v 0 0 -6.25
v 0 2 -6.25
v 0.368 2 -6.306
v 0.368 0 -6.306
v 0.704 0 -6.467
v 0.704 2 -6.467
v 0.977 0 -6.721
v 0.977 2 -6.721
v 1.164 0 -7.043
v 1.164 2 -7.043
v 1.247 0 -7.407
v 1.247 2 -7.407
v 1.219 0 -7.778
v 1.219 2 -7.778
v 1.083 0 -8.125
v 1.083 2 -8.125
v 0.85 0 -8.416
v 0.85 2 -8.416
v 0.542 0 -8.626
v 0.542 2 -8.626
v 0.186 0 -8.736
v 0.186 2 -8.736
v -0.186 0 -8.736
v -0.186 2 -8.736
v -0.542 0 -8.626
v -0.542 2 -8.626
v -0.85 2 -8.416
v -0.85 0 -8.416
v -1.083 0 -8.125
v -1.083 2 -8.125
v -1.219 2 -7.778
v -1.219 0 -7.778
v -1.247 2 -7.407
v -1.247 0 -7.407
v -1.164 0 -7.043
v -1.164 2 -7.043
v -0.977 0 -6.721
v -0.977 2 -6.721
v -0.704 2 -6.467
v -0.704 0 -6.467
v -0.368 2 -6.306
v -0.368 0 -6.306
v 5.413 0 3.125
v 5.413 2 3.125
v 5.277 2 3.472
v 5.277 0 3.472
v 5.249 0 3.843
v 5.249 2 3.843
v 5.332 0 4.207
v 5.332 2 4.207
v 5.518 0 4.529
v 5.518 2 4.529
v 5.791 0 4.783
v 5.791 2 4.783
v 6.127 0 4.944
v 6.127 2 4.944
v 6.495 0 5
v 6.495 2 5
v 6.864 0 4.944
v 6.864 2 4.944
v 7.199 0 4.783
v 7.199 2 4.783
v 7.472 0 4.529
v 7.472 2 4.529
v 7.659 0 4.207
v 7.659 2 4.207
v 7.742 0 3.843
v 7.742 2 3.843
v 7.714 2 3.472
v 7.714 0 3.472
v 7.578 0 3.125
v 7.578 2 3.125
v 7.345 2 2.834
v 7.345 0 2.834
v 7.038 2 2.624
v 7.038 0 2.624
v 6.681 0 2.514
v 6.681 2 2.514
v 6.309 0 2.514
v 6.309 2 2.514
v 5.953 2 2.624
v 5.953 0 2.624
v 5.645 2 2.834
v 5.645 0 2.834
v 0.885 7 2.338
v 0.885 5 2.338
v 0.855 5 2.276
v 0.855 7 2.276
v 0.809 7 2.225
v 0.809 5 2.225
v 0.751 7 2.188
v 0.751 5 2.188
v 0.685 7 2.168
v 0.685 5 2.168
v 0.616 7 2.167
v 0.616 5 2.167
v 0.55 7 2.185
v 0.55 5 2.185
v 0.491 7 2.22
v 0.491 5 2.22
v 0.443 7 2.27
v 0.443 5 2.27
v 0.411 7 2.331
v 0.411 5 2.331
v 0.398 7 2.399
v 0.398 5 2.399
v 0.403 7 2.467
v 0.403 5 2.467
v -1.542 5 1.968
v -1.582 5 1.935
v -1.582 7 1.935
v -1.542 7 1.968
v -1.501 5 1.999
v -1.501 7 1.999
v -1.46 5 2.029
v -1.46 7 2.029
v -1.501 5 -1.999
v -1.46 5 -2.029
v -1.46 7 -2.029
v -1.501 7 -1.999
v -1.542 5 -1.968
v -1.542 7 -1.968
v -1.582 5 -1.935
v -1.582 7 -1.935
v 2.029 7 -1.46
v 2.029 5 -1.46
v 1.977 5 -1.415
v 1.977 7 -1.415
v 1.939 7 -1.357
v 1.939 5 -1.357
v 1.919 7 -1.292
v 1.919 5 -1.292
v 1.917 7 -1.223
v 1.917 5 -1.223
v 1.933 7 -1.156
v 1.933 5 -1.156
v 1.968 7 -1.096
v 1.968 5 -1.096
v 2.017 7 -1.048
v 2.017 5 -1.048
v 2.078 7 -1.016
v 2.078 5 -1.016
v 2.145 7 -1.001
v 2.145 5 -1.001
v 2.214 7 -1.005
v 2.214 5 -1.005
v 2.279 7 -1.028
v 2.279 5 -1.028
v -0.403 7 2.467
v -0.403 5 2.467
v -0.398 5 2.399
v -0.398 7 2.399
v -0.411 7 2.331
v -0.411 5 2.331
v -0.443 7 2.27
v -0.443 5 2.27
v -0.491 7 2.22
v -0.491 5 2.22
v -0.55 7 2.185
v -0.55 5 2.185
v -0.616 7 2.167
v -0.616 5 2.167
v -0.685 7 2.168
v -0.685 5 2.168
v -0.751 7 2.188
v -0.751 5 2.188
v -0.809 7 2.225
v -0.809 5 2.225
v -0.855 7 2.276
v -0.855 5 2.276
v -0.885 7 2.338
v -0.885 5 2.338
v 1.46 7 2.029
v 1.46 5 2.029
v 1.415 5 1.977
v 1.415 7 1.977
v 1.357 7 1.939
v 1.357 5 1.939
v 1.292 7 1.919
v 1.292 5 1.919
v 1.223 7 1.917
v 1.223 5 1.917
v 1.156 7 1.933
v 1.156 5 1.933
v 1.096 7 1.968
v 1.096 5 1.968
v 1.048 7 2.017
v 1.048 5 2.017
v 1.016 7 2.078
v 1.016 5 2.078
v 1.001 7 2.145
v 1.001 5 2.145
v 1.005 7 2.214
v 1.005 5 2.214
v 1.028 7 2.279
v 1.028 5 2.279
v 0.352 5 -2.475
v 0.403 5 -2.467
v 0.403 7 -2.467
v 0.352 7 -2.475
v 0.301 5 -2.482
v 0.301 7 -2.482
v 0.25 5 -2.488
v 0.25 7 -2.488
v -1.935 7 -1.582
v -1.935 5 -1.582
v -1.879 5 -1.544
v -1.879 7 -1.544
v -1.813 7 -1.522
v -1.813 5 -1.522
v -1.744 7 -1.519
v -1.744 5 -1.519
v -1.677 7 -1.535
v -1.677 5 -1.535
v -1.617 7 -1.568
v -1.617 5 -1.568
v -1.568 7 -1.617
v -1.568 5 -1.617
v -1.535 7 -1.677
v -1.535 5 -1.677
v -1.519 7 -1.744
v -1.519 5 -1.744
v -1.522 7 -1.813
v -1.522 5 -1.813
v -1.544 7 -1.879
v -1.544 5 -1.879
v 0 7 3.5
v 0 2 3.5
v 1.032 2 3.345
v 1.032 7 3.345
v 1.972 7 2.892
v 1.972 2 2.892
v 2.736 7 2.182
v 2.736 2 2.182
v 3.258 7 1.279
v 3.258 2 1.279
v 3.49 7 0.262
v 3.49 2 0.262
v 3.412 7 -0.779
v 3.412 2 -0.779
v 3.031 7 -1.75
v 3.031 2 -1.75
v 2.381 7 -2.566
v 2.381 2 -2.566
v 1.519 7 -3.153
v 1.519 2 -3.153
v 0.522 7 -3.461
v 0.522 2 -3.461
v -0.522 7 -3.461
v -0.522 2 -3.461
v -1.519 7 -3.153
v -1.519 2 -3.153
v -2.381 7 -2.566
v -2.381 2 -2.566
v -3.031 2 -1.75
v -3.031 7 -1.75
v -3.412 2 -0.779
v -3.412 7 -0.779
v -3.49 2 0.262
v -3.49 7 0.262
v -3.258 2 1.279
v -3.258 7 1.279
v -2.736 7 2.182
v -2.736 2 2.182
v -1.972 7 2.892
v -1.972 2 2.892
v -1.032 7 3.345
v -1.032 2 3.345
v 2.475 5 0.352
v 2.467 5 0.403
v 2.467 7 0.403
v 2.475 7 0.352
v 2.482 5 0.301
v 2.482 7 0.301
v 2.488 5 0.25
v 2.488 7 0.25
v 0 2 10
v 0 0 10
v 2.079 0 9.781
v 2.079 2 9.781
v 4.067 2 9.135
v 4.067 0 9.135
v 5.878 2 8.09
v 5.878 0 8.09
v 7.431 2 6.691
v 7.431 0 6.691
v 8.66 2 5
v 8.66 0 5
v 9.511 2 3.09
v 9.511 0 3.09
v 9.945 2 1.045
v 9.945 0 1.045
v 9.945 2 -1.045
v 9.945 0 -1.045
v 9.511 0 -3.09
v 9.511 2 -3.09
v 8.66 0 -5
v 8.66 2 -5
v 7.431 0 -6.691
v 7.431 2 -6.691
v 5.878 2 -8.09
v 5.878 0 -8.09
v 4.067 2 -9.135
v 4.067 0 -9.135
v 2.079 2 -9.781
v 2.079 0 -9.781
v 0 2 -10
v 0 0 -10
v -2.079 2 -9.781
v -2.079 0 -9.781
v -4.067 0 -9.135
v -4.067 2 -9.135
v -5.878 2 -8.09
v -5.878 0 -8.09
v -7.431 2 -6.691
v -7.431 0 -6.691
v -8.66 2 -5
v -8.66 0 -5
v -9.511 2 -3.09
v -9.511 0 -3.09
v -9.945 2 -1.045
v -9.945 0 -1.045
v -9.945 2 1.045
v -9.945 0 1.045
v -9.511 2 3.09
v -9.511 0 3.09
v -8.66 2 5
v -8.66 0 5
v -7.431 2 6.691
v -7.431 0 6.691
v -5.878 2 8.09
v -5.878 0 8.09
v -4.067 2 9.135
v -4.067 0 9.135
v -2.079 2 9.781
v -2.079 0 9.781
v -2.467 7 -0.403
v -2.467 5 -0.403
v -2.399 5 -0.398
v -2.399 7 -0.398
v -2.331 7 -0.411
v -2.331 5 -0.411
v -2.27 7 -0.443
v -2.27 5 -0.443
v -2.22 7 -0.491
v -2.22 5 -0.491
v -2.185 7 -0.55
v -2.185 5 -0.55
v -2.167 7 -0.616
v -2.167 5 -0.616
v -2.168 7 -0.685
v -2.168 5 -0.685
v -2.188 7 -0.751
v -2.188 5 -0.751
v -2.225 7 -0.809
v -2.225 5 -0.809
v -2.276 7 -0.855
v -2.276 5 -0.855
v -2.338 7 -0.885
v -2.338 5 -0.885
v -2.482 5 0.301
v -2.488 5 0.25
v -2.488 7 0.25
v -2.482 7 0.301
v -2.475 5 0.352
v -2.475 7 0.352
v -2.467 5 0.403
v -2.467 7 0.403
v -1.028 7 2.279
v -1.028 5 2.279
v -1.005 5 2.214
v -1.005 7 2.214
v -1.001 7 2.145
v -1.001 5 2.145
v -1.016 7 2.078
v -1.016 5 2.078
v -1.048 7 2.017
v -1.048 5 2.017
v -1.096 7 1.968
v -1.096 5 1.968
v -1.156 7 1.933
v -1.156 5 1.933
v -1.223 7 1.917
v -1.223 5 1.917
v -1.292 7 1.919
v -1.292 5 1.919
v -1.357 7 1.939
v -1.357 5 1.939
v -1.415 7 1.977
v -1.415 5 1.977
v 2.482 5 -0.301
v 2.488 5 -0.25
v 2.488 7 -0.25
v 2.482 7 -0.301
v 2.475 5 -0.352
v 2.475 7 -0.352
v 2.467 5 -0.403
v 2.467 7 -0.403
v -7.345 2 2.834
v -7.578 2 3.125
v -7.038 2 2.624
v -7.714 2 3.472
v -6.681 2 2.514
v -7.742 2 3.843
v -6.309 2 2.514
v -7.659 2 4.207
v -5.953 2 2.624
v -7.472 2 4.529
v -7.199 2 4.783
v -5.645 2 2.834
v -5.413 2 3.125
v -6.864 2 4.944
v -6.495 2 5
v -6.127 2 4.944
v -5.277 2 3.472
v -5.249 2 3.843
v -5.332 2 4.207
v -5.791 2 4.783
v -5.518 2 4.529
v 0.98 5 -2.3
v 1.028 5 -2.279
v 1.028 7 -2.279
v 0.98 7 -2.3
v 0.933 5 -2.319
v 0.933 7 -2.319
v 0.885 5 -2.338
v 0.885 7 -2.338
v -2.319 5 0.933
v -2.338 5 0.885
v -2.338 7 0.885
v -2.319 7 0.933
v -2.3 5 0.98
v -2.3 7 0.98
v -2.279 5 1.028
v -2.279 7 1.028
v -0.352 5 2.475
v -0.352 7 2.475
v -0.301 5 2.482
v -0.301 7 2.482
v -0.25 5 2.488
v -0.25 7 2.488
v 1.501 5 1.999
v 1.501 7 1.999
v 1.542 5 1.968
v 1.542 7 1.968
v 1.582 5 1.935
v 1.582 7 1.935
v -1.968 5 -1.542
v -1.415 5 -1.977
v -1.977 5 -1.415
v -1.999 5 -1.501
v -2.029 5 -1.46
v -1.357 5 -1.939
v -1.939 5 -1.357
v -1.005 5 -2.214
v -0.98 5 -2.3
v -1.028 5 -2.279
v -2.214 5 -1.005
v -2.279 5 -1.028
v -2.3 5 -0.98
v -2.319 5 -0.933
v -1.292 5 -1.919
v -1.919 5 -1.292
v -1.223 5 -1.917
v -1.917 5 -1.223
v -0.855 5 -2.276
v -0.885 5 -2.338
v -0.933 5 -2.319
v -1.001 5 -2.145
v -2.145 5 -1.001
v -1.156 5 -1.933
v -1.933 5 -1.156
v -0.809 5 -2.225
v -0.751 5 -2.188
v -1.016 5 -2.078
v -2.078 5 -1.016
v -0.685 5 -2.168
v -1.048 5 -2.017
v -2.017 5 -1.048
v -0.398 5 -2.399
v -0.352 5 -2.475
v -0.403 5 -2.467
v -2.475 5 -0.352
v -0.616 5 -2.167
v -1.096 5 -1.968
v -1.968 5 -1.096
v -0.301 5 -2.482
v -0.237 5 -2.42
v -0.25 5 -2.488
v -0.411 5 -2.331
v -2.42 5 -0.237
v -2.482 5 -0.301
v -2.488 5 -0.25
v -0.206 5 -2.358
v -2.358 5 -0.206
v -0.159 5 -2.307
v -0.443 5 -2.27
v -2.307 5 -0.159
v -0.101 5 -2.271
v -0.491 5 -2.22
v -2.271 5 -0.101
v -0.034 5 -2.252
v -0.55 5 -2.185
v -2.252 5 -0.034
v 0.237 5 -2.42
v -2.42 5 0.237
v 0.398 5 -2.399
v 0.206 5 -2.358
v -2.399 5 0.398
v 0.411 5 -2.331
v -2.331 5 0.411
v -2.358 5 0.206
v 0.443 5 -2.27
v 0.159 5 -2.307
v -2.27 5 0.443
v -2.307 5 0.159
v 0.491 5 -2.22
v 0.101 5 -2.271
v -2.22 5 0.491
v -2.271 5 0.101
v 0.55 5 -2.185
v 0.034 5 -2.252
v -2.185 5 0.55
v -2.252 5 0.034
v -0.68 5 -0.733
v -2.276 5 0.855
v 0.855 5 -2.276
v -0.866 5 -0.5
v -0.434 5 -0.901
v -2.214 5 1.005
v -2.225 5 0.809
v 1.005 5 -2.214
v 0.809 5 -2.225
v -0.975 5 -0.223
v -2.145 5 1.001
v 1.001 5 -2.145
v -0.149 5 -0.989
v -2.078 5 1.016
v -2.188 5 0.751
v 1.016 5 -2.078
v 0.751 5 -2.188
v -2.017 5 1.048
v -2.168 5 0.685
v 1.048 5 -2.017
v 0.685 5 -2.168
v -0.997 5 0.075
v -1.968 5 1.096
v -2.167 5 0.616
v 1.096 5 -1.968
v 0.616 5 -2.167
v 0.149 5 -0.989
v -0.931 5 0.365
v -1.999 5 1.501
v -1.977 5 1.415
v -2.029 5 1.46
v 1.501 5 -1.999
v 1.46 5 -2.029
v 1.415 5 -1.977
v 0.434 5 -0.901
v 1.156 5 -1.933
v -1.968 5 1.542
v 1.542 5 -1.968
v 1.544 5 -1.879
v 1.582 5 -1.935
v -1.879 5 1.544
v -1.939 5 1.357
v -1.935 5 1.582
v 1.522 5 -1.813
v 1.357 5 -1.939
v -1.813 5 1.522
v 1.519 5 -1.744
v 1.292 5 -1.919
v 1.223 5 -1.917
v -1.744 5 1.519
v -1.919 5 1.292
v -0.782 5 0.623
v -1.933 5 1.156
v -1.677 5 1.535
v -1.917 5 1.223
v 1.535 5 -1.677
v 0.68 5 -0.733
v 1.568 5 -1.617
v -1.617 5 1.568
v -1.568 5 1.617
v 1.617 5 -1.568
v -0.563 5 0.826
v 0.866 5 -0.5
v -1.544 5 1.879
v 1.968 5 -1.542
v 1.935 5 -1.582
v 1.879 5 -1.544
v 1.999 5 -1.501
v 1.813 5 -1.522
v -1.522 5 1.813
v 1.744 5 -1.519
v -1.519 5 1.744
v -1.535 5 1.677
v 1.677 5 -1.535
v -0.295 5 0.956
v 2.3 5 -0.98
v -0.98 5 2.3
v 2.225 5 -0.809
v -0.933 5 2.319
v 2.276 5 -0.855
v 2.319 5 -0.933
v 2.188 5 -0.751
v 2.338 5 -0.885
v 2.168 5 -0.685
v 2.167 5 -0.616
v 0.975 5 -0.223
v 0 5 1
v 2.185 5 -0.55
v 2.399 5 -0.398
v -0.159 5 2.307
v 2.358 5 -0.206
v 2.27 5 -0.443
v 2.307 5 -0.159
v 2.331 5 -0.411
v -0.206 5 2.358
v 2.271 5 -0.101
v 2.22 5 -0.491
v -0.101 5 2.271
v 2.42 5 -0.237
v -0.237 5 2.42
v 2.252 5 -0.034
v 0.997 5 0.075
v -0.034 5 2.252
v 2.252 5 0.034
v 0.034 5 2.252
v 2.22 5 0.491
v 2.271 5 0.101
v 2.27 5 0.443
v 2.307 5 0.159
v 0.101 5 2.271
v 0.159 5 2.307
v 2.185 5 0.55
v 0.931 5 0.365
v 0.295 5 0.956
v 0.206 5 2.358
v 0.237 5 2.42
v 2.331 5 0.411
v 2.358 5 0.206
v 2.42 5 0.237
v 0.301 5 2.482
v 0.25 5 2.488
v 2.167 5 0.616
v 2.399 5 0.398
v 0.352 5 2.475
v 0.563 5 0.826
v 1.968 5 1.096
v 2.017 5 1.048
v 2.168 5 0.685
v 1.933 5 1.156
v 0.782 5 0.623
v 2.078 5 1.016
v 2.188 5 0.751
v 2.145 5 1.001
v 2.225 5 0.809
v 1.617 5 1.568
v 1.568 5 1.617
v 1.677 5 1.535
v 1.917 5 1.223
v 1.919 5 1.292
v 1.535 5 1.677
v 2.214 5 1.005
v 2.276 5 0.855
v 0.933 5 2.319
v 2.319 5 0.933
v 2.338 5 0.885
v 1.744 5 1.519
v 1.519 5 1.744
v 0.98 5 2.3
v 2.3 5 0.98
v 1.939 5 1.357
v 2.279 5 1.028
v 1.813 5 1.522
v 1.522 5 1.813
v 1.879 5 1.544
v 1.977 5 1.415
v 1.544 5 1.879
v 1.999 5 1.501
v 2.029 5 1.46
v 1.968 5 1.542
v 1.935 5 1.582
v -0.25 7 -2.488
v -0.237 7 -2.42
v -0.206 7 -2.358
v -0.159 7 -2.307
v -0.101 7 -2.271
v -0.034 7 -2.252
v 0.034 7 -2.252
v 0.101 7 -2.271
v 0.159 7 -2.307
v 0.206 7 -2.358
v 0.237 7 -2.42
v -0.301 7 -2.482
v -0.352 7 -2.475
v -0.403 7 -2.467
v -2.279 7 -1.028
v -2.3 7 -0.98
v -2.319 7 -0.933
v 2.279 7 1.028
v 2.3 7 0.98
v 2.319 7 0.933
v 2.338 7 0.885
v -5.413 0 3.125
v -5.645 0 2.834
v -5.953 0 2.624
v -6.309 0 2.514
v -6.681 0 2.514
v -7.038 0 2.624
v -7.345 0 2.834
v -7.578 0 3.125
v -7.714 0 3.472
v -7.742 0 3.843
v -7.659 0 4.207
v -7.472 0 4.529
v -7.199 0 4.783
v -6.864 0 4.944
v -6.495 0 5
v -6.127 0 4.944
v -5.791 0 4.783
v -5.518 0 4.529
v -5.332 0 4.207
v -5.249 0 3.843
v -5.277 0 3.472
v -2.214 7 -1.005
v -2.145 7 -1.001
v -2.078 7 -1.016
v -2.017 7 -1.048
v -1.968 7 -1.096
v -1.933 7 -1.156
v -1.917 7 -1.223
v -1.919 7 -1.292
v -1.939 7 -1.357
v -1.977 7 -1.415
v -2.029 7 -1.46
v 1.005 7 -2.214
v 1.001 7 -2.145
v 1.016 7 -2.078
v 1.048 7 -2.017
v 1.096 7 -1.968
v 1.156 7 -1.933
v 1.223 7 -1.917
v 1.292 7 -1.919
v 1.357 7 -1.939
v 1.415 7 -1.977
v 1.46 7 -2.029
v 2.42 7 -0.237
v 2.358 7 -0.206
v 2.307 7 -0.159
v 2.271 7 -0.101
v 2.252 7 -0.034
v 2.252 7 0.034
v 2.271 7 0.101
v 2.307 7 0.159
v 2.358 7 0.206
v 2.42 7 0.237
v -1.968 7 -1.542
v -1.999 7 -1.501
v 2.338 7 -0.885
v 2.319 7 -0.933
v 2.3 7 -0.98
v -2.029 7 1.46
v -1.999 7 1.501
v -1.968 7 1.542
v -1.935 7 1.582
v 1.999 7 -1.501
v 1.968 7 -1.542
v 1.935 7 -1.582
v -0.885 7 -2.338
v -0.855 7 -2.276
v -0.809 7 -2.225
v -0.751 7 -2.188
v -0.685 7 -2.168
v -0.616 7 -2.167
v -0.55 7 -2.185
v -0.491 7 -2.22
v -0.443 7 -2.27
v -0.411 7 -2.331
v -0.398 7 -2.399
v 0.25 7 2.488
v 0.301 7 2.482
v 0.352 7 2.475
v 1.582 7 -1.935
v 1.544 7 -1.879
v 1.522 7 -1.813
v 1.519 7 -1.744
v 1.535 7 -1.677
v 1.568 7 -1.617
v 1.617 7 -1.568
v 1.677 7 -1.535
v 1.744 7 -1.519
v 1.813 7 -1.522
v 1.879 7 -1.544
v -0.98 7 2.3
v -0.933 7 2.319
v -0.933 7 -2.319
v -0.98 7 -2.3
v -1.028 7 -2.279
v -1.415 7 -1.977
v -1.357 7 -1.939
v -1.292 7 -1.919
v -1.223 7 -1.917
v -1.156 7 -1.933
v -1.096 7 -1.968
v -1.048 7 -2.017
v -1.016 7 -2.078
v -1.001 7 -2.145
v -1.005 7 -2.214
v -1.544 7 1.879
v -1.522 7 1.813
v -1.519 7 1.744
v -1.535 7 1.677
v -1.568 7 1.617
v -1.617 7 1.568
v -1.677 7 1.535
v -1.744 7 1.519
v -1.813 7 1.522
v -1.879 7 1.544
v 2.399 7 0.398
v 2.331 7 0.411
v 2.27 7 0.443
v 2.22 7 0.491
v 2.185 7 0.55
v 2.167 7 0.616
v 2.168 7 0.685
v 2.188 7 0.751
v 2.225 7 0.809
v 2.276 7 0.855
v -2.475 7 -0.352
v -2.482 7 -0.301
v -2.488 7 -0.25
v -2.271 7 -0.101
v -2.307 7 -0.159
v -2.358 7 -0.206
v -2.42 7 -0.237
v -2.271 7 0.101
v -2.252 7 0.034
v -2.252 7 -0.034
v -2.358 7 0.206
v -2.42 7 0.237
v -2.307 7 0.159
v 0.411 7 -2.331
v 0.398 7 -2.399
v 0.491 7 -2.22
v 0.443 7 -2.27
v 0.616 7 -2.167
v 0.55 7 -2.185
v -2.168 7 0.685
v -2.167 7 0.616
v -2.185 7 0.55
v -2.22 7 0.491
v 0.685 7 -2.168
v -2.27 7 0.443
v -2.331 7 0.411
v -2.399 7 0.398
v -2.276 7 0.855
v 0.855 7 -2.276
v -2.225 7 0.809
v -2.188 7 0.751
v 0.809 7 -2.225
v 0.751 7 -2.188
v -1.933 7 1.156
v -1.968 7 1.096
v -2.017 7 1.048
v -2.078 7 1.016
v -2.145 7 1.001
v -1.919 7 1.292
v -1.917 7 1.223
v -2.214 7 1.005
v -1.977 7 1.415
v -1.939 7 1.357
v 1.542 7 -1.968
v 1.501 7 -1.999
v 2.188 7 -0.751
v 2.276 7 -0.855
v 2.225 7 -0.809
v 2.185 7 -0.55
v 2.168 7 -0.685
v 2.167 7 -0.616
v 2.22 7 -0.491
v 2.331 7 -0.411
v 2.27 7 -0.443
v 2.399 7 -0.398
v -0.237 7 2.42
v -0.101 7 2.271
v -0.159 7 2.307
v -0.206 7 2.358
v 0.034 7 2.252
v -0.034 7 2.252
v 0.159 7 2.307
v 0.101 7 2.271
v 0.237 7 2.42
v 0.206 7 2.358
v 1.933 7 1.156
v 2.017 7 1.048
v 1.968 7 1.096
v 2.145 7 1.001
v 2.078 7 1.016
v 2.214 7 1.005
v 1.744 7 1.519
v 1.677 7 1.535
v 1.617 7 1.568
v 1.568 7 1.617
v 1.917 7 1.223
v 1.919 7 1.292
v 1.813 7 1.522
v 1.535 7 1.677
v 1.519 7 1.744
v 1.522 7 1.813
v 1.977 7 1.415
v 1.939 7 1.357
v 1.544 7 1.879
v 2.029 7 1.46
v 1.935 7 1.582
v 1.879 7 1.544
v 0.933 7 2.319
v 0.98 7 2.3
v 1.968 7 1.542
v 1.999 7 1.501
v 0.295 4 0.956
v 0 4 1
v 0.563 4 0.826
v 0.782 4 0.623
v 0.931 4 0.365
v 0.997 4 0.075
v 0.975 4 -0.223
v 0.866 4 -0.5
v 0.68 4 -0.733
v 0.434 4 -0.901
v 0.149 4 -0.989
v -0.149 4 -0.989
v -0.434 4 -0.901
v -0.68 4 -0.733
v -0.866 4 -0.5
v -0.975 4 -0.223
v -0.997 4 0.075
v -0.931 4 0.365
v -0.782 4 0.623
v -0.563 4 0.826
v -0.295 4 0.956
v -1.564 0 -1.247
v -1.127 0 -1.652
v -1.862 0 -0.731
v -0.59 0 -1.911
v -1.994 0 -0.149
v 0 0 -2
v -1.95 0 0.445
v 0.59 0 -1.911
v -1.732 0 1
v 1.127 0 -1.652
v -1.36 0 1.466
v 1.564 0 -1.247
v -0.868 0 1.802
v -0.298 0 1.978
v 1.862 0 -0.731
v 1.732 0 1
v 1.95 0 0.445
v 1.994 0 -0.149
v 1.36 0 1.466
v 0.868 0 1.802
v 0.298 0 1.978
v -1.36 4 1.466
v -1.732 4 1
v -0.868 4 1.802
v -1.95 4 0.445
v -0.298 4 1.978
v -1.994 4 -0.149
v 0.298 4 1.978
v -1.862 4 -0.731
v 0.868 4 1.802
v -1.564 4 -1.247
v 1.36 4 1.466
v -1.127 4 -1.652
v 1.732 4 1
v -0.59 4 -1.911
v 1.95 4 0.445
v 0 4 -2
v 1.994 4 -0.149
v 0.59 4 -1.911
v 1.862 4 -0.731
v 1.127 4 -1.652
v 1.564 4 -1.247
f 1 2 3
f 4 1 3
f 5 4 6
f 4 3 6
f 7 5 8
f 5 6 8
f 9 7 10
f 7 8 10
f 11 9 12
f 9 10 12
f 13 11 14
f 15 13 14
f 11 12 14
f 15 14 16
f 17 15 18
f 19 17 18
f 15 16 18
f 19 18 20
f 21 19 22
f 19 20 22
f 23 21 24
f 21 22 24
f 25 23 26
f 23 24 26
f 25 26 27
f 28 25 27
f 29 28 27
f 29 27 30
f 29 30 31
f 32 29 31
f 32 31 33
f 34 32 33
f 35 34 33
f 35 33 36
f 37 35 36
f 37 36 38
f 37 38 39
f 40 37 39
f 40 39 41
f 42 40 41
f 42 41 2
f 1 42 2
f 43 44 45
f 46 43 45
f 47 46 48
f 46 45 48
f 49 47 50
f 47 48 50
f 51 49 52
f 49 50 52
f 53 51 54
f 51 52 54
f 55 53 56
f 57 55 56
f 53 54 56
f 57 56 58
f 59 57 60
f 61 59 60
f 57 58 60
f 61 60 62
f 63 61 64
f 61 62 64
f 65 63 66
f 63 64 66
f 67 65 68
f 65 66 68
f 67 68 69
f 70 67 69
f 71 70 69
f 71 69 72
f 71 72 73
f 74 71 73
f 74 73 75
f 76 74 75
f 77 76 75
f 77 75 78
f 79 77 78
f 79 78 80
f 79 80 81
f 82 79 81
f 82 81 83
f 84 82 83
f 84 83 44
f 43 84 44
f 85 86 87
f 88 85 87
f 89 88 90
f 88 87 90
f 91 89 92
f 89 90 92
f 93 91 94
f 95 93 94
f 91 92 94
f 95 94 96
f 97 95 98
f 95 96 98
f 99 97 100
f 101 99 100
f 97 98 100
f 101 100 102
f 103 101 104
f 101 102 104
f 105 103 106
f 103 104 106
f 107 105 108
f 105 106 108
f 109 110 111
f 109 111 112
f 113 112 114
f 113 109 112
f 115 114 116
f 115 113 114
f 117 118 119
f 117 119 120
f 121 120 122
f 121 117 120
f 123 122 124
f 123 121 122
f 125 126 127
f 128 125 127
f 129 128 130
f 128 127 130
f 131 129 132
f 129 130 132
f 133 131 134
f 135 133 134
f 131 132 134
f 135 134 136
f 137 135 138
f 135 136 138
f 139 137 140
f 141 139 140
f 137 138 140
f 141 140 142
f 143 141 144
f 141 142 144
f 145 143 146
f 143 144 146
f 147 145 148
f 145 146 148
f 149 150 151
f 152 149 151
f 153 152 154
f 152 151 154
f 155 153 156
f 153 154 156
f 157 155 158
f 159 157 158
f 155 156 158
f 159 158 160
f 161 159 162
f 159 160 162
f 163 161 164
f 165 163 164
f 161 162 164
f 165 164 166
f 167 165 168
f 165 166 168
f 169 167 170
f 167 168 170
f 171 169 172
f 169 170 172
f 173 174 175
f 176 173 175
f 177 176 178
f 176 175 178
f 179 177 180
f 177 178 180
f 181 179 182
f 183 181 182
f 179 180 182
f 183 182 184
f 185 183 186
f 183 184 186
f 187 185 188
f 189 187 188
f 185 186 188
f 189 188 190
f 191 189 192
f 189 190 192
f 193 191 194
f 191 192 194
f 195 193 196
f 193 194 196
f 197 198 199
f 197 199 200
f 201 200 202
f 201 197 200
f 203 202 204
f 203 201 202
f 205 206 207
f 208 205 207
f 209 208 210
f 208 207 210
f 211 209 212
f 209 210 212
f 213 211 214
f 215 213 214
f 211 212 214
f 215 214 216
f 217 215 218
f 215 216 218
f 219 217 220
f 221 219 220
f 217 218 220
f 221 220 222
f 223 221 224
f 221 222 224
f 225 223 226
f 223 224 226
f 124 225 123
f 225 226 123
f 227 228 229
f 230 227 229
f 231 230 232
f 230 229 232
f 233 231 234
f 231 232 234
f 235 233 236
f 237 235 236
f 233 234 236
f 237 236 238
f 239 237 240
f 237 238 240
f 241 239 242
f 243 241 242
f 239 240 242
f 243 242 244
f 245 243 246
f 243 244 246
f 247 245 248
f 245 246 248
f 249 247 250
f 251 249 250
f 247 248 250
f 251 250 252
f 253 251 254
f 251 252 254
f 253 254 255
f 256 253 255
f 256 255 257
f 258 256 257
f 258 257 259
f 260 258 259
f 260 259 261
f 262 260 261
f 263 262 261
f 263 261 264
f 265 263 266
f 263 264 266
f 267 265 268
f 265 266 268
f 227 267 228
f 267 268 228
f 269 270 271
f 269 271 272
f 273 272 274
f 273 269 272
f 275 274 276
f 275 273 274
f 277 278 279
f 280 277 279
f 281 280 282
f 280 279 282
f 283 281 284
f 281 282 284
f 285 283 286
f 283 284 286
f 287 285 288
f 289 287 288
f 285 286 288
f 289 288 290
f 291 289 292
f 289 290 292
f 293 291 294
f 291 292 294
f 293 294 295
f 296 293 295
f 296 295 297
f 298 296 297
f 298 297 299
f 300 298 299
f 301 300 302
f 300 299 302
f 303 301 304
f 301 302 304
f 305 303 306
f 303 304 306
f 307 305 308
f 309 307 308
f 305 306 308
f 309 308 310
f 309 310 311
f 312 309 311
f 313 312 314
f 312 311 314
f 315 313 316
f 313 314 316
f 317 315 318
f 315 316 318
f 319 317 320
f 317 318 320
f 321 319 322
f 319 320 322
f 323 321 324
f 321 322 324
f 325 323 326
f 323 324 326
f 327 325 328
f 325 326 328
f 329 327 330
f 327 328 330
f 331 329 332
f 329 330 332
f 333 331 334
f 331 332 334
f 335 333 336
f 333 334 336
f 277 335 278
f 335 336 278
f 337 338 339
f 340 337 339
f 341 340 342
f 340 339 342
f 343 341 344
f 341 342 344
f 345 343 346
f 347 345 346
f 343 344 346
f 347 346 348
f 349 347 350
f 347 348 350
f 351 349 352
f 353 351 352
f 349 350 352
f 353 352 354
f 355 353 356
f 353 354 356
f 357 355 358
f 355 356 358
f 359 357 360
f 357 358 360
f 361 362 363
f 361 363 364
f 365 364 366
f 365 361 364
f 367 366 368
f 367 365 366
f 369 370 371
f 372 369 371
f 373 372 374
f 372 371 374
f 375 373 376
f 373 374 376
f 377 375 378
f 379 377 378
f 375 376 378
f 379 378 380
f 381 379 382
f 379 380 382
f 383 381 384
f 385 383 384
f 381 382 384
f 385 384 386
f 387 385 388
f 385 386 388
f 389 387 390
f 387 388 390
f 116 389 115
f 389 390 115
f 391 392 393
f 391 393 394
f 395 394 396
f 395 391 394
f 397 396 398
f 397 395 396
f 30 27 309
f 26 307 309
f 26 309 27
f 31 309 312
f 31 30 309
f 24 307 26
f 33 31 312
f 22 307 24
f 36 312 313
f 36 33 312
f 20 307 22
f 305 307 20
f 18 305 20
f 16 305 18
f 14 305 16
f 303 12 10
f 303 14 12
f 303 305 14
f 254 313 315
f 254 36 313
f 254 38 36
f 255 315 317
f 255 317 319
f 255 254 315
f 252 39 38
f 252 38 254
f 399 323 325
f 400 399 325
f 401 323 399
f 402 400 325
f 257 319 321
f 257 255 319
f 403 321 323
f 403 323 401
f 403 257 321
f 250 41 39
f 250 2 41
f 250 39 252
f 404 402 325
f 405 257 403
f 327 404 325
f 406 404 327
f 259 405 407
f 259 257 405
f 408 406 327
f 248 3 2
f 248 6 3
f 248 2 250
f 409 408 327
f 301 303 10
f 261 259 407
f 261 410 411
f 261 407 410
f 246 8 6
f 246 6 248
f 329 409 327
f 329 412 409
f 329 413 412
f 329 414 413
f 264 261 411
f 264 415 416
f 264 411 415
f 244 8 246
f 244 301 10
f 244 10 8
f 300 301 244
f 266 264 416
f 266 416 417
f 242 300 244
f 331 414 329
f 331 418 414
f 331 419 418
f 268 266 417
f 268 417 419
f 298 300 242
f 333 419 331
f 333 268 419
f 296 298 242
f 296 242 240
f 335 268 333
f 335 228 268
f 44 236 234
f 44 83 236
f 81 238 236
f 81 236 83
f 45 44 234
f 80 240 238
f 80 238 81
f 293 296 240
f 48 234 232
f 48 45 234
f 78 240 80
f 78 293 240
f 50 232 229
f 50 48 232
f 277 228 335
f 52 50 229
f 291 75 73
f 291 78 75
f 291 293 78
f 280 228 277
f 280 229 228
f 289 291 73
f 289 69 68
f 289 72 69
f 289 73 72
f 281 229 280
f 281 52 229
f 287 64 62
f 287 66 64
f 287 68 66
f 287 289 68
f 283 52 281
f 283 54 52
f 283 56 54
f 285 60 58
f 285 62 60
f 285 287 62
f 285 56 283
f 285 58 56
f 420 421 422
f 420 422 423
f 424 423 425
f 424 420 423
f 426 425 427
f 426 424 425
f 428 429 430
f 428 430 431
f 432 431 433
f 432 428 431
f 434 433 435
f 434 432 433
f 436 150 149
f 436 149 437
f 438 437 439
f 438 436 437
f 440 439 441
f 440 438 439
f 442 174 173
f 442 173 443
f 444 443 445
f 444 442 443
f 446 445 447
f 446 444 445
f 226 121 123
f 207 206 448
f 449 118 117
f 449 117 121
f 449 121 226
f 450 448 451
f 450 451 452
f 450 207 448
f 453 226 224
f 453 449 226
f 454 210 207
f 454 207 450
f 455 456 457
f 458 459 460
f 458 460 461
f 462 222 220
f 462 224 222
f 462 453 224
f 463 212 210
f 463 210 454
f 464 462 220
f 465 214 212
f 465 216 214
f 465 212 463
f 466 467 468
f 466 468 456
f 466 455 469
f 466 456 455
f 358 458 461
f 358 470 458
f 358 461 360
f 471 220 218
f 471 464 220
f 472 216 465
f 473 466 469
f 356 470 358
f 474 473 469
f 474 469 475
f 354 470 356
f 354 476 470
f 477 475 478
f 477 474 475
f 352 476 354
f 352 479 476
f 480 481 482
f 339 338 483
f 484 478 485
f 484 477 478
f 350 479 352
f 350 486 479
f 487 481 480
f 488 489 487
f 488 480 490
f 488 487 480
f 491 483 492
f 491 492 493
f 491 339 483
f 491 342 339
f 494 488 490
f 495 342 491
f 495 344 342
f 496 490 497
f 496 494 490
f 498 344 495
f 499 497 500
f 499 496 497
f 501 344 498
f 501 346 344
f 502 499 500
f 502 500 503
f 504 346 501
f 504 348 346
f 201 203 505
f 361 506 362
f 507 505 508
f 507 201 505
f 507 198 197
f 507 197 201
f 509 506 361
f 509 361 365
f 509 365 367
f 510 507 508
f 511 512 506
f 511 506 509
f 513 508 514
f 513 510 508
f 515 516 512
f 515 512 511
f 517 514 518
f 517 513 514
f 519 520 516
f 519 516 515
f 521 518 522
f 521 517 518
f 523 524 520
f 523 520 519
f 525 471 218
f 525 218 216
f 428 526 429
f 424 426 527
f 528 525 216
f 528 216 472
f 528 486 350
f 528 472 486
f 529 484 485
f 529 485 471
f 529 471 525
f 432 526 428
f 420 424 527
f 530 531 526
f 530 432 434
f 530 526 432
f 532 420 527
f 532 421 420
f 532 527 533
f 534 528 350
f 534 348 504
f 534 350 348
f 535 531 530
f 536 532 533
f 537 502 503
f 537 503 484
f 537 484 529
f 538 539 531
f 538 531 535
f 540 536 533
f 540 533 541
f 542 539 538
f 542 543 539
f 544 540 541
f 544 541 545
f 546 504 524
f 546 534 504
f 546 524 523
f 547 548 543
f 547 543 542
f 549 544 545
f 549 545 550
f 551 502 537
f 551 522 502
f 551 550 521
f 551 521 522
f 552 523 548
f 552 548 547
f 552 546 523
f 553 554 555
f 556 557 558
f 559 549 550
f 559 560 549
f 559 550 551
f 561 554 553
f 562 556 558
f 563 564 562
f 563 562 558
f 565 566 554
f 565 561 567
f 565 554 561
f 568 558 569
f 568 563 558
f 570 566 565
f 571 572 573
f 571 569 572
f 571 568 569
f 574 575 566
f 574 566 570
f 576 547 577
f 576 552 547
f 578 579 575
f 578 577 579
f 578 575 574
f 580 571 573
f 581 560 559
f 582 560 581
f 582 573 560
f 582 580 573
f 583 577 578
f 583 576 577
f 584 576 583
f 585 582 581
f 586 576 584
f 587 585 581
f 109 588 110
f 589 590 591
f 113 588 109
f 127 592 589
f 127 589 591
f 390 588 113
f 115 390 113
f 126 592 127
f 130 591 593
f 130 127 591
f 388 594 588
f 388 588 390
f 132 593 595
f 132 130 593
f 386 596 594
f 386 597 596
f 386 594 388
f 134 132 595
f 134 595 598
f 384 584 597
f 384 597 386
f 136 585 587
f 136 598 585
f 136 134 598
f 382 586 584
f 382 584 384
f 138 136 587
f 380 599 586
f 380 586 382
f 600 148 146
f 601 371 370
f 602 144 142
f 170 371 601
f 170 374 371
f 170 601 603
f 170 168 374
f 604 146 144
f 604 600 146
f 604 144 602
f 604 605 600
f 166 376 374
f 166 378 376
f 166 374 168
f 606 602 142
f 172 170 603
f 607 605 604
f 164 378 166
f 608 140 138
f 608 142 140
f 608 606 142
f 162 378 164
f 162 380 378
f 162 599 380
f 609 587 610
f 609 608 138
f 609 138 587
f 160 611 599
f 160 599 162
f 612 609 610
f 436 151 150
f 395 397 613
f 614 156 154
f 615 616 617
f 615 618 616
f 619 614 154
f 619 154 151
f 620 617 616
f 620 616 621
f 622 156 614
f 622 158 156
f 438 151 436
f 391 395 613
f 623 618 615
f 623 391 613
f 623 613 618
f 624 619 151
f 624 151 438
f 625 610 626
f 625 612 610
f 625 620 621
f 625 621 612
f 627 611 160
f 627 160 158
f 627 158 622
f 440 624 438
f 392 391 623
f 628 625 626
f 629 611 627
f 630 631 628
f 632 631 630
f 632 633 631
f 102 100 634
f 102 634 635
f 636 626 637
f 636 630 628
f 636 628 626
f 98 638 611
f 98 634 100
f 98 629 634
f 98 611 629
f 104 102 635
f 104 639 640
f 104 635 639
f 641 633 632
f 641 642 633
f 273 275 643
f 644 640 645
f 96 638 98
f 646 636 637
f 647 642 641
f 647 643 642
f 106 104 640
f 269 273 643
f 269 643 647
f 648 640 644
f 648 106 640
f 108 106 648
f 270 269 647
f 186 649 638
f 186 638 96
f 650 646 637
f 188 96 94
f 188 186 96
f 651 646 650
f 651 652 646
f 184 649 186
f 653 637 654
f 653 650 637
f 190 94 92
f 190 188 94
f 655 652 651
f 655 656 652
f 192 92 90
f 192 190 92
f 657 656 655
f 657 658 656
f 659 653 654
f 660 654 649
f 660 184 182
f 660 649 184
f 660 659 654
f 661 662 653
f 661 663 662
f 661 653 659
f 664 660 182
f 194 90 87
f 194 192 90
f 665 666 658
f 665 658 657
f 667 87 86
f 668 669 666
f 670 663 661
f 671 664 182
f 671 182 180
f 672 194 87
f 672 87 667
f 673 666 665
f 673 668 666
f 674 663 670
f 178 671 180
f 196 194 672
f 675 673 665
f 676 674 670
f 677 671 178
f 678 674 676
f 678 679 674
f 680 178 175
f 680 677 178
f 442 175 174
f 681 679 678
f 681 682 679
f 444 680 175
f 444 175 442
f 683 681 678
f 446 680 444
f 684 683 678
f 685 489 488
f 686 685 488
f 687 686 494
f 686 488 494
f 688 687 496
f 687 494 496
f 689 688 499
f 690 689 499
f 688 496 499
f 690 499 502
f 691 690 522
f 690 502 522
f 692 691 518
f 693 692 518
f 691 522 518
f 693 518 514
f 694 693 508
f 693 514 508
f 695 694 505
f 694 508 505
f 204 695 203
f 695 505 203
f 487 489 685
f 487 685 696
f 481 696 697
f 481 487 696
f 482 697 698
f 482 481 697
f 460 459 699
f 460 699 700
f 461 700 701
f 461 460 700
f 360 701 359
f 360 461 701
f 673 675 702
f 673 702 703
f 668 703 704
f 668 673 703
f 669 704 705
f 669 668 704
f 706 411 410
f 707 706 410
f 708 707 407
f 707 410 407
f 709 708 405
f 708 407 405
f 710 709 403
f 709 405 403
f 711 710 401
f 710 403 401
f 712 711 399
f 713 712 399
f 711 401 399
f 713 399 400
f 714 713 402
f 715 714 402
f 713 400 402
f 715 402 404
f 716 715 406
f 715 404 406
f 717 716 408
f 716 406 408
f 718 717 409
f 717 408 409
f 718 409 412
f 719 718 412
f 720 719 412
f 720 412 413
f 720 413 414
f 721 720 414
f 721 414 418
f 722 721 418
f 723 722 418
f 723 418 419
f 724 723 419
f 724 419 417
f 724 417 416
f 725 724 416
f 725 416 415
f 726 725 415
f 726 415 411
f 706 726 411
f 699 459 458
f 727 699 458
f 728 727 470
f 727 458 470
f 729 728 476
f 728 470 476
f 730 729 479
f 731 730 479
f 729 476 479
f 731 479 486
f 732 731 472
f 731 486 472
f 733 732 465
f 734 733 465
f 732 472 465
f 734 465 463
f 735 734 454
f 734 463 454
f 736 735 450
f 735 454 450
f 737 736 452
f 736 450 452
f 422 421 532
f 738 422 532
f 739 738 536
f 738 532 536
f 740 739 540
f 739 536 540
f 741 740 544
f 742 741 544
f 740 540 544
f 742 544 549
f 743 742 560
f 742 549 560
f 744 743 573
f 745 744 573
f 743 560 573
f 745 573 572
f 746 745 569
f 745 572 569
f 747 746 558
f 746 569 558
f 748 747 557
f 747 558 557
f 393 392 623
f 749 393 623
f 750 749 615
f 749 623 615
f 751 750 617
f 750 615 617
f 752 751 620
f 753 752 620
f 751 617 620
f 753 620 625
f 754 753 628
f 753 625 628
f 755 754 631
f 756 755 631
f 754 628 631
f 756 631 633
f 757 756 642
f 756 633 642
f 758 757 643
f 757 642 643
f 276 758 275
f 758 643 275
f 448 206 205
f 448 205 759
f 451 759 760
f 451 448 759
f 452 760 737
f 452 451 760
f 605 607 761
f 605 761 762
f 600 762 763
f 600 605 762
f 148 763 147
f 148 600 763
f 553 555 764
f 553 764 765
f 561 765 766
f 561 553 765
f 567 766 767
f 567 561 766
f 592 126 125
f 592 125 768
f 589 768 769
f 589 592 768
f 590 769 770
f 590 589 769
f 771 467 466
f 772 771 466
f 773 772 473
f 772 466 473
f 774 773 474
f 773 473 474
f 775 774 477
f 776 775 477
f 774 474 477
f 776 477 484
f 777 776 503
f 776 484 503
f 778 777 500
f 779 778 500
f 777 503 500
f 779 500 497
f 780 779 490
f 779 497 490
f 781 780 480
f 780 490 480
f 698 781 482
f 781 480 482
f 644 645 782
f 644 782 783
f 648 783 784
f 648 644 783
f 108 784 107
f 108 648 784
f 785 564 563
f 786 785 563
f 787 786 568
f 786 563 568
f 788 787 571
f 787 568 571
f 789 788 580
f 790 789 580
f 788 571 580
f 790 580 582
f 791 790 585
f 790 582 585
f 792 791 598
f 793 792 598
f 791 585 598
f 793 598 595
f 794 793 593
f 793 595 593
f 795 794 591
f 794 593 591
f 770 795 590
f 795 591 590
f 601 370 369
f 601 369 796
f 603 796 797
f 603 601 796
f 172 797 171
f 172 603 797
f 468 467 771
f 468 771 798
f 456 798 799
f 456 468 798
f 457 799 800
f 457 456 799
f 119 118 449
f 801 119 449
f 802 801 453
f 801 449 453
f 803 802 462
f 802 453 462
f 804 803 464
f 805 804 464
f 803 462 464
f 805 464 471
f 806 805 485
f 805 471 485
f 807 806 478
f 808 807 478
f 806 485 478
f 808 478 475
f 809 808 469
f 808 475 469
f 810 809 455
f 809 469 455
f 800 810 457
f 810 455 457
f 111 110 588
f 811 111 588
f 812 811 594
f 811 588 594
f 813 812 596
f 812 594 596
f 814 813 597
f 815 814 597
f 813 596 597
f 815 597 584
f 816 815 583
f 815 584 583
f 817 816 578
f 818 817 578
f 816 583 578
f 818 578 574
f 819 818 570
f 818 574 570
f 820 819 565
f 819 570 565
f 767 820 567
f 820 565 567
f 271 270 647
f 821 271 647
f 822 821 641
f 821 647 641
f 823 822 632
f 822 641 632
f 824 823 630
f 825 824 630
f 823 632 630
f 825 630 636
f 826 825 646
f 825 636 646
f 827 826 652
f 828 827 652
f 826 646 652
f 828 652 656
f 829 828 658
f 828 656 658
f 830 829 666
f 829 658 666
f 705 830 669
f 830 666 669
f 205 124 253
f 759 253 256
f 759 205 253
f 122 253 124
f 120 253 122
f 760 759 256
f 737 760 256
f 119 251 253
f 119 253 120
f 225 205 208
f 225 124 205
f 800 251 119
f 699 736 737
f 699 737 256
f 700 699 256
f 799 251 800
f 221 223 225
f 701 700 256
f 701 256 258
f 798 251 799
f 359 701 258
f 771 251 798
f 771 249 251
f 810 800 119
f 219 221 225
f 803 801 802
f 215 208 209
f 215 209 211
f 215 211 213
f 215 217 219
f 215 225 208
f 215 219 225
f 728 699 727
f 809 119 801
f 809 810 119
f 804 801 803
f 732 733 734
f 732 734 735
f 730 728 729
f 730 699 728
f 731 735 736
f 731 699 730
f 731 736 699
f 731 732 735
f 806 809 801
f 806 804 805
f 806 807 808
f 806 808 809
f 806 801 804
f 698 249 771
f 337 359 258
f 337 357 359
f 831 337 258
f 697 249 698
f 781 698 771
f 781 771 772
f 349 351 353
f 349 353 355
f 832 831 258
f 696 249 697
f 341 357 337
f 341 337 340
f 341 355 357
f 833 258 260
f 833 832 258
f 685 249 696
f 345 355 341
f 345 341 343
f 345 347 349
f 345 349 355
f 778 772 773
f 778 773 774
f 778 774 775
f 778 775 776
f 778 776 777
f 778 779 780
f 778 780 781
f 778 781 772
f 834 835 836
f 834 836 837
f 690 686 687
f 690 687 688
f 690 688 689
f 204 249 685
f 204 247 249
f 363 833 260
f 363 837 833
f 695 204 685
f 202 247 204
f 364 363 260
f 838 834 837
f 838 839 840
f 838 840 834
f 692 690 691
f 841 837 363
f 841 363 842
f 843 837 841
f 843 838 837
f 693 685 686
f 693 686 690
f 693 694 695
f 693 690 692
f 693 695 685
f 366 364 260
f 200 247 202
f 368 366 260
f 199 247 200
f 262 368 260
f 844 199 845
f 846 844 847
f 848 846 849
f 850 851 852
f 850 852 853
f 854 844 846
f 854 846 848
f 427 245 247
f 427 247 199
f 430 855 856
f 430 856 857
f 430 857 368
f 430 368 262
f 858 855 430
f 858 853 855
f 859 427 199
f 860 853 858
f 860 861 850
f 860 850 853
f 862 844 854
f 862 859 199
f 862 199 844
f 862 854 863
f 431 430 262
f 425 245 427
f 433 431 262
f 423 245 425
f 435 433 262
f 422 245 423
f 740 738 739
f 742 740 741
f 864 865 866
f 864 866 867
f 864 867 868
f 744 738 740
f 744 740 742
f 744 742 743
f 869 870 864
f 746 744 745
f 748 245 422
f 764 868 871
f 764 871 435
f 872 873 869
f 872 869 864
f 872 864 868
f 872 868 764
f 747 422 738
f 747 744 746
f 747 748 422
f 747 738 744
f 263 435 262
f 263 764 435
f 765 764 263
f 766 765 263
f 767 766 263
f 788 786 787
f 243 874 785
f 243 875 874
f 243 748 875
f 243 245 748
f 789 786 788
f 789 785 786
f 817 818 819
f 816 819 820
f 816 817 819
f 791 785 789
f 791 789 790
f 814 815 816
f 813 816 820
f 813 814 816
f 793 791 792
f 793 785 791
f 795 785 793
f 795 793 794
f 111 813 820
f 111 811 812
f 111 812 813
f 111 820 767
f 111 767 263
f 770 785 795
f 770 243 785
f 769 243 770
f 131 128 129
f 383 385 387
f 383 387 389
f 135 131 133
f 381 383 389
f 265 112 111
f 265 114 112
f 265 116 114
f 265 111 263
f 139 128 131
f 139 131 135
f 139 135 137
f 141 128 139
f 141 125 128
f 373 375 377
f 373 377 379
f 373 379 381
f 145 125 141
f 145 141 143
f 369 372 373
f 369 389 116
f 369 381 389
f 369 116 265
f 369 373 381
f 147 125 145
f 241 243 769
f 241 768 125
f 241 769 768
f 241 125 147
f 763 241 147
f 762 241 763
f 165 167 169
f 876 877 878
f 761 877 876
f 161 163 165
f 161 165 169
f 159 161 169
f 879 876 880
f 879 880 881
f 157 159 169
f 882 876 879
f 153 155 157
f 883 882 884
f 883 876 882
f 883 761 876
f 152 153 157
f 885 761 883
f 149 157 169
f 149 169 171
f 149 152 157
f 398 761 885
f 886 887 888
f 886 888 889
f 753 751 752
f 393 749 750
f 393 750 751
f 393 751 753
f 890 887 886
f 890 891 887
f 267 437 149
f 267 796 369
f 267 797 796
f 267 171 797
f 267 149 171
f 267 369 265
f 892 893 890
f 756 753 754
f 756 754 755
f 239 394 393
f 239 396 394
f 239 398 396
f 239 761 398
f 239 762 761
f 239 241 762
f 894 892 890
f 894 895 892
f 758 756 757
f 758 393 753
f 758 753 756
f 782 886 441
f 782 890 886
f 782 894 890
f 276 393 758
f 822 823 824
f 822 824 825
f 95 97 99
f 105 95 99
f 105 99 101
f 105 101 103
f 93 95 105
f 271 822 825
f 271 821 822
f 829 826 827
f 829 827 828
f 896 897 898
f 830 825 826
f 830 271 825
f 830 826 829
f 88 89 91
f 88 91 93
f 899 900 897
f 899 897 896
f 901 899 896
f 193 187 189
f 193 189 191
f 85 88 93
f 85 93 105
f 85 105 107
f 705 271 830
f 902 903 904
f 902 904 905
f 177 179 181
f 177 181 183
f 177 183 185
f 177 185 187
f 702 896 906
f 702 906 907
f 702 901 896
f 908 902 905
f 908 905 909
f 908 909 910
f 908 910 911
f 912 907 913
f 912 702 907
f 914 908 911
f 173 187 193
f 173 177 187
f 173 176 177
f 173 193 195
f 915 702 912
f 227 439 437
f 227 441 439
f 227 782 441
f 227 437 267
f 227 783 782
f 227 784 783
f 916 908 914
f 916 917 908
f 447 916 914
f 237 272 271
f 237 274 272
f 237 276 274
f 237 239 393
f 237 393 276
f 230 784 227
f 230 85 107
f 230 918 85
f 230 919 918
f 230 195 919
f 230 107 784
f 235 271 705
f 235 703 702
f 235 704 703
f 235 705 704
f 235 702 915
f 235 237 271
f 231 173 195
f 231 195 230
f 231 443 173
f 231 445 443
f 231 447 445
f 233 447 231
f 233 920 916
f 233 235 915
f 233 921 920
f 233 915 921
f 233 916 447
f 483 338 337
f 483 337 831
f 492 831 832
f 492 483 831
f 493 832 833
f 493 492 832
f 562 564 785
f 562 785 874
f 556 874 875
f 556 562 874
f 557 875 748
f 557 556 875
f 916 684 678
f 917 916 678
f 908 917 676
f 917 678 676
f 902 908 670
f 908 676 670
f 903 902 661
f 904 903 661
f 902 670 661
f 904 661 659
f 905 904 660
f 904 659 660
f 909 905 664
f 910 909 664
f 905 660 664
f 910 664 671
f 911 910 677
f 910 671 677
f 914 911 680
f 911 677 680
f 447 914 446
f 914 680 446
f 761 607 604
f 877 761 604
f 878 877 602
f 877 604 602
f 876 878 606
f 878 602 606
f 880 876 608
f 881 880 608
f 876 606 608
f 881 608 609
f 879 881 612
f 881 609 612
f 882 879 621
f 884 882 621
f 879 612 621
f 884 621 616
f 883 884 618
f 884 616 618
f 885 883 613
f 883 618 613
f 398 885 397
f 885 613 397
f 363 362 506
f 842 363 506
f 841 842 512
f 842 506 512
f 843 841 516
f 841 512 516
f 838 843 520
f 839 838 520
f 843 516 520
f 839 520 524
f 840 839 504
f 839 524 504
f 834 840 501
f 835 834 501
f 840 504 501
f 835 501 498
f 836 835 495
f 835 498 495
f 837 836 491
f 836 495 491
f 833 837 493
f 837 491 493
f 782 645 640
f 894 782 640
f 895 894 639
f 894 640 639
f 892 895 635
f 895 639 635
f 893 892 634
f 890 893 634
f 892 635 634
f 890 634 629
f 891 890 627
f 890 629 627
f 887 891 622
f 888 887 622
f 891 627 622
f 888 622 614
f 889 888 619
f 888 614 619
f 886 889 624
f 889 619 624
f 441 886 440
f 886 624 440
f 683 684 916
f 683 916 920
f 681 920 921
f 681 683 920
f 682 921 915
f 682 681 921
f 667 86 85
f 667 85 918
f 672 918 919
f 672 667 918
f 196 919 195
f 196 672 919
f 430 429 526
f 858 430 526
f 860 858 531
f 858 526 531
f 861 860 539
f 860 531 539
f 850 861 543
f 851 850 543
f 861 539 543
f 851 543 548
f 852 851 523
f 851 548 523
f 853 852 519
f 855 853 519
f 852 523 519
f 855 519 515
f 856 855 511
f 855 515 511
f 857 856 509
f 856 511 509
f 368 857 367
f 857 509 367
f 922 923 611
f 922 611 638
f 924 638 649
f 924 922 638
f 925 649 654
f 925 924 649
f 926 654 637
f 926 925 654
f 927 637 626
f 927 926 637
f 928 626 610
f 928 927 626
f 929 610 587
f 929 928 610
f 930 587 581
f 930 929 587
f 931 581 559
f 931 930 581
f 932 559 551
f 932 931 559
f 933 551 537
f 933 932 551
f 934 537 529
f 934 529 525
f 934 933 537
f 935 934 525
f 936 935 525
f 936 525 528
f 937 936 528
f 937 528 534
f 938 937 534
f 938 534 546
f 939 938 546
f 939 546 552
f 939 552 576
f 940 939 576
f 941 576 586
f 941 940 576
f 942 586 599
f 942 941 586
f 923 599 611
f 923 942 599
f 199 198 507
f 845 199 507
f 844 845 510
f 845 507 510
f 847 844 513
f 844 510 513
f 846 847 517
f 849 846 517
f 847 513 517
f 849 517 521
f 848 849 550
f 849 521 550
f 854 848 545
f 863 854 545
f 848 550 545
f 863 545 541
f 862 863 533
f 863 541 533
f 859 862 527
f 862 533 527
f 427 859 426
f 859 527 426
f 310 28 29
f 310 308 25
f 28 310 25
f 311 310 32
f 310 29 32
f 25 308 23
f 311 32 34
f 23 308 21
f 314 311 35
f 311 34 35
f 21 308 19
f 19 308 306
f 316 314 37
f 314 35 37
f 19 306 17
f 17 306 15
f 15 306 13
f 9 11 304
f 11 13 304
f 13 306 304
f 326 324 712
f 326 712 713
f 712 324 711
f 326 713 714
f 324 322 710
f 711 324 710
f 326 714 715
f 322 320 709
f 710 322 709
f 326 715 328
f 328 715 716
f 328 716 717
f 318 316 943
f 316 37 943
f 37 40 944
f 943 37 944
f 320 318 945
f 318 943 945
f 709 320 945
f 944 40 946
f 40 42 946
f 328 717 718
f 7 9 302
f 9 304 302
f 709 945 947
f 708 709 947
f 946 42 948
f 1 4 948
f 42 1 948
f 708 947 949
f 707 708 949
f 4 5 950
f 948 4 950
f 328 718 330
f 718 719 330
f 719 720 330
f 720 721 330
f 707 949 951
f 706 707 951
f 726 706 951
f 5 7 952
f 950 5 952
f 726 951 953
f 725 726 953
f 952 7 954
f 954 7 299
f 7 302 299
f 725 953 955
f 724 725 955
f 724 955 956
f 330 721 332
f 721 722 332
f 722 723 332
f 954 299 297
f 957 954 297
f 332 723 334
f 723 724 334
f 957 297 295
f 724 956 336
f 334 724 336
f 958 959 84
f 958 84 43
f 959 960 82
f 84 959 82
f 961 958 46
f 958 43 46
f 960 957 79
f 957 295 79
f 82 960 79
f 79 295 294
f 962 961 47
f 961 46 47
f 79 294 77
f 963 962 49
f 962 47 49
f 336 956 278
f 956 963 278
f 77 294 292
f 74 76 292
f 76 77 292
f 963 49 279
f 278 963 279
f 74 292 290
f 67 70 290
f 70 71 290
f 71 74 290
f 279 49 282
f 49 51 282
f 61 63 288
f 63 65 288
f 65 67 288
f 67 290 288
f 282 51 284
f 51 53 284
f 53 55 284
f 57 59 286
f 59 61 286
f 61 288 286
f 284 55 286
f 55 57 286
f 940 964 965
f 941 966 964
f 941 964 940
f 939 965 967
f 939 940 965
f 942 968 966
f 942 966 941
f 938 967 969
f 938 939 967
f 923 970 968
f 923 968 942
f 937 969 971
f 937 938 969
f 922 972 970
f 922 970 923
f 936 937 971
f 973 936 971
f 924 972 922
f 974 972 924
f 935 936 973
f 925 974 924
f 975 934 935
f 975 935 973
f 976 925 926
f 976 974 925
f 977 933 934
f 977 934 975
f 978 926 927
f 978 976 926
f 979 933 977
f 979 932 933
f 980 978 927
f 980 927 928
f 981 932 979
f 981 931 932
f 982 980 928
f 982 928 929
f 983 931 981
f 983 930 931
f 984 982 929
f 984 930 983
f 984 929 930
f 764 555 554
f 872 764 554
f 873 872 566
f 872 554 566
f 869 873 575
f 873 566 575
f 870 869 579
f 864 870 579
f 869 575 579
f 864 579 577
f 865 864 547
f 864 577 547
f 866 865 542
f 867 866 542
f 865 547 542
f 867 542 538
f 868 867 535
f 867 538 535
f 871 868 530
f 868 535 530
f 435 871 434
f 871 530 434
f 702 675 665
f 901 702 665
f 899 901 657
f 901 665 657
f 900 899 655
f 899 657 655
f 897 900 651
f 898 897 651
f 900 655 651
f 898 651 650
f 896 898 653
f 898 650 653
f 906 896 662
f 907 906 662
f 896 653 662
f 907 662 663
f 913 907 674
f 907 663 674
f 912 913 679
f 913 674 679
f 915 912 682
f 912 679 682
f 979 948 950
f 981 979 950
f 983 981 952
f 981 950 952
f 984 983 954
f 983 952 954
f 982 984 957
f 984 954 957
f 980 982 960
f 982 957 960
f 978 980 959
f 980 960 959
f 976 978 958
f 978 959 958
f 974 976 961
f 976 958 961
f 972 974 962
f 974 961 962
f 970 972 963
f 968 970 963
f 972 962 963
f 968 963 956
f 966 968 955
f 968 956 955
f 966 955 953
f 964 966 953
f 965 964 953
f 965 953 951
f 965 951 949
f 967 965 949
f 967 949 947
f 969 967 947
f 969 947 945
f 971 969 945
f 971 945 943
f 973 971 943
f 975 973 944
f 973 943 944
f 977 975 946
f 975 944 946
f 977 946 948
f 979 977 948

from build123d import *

# Parameters (mm, degrees)
SKETCH1_R           = 10
SKETCH1_R_2         = 1
BOSS_EXTRUDE1_DEPTH = 2
SKETCH2_R           = 3.5
SKETCH2_R_2         = 2.5
BOSS_EXTRUDE2_DEPTH = 5
CUT_EXTRUDE1_REACH  = 17
SKETCH3_R           = 1.25
CIRPATTERN1_COUNT   = 3
SKETCH4_R           = 2.5
SKETCH4_R_2         = 1
BOSS_EXTRUDE3_DEPTH = 3
SKETCH5_R           = 2
CUT_EXTRUDE2_DEPTH  = 4
BOSS_EXTRUDE4_START = -2
BOSS_EXTRUDE4_DEPTH = 2
CIRPATTERN2_COUNT   = 24


with BuildPart() as part:
    # Sketch1 → Boss-Extrude1 (new body)
    with BuildSketch(Plane(origin=(0, 0, 0), x_dir=(1, 0, 0), z_dir=(0, 1, 0))):
        with Locations(Location((0, 0, 0), (0, 0, 270))):
            Circle(SKETCH1_R)
        with Locations(Location((0, 0, 0), (0, 0, 270))):
            Circle(SKETCH1_R_2, mode=Mode.SUBTRACT)
    extrude(amount=BOSS_EXTRUDE1_DEPTH)

    # Sketch2 → Boss-Extrude2 (add)
    with BuildSketch(Plane(origin=(0, 2, 0), x_dir=(1, 0, 0), z_dir=(0, 1, 0))):
        with Locations(Location((0, 0, 0), (0, 0, 270))):
            Circle(SKETCH2_R)
        with Locations(Location((0, 0, 0), (0, 0, 270))):
            Circle(SKETCH2_R_2, mode=Mode.SUBTRACT)
    extrude(amount=BOSS_EXTRUDE2_DEPTH)

    # Sketch3 → Cut-Extrude1 (cut, up to next)
    with BuildSketch(Plane(origin=(0, 2, 0), x_dir=(1, 0, 0), z_dir=(0, 1, 0)), mode=Mode.PRIVATE) as cut_extrude1_sk1:
        with Locations(Location((0, 7.5, 0), (0, 0, 270))):
            Circle(SKETCH3_R)
    cut_extrude1_tool1 = extrude(cut_extrude1_sk1.sketch, amount=-CUT_EXTRUDE1_REACH, mode=Mode.PRIVATE) & part.part
    cut_extrude1 = cut_extrude1_tool1.solids().sort_by_distance((0, 2, -7.5))[0]
    add(cut_extrude1, mode=Mode.SUBTRACT)

    # CirPattern1: Cut-Extrude1 ×3 about axis
    cirpattern1_axis = Axis((0, 0, 0), (0, 1, 0))
    for i in range(1, CIRPATTERN1_COUNT):
        add(cut_extrude1.rotate(cirpattern1_axis, i * 360 / CIRPATTERN1_COUNT), mode=Mode.SUBTRACT)

    # Sketch4 → Boss-Extrude3 (add)
    with BuildSketch(Plane(origin=(0, 2, 0), x_dir=(1, 0, 0), z_dir=(0, 1, 0))):
        with Locations(Location((0, 0, 0), (0, 0, 270))):
            Circle(SKETCH4_R)
        with Locations(Location((0, 0, 0), (0, 0, 270))):
            Circle(SKETCH4_R_2, mode=Mode.SUBTRACT)
    extrude(amount=BOSS_EXTRUDE3_DEPTH)

    # Sketch5 → Cut-Extrude2 (cut)
    with BuildSketch(Plane.XZ):
        with Locations(Location((0, 0, 0), (0, 0, 270))):
            Circle(SKETCH5_R)
    extrude(amount=-CUT_EXTRUDE2_DEPTH, mode=Mode.SUBTRACT)

    # Sketch6 → Boss-Extrude4 (add)
    with BuildSketch(Plane(origin=(0, 7, 0), x_dir=(1, 0, 0), z_dir=(0, 1, 0)).offset(BOSS_EXTRUDE4_START)):
        with BuildLine():
            ThreePointArc((-0.249687304, 2.4875), (0, 2.25), (0.249687304, 2.4875))
            ThreePointArc((0.249687304, 2.4875), (0, 2.5), (-0.249687304, 2.4875))
        make_face()
    boss_extrude4 = extrude(amount=BOSS_EXTRUDE4_DEPTH)

    # CirPattern2: Boss-Extrude4 ×24 about axis
    cirpattern2_axis = Axis((0, 0, 0), (0, 1, 0))
    for i in range(1, CIRPATTERN2_COUNT):
        add(boss_extrude4.rotate(cirpattern2_axis, i * 360 / CIRPATTERN2_COUNT))


solid = part.part
